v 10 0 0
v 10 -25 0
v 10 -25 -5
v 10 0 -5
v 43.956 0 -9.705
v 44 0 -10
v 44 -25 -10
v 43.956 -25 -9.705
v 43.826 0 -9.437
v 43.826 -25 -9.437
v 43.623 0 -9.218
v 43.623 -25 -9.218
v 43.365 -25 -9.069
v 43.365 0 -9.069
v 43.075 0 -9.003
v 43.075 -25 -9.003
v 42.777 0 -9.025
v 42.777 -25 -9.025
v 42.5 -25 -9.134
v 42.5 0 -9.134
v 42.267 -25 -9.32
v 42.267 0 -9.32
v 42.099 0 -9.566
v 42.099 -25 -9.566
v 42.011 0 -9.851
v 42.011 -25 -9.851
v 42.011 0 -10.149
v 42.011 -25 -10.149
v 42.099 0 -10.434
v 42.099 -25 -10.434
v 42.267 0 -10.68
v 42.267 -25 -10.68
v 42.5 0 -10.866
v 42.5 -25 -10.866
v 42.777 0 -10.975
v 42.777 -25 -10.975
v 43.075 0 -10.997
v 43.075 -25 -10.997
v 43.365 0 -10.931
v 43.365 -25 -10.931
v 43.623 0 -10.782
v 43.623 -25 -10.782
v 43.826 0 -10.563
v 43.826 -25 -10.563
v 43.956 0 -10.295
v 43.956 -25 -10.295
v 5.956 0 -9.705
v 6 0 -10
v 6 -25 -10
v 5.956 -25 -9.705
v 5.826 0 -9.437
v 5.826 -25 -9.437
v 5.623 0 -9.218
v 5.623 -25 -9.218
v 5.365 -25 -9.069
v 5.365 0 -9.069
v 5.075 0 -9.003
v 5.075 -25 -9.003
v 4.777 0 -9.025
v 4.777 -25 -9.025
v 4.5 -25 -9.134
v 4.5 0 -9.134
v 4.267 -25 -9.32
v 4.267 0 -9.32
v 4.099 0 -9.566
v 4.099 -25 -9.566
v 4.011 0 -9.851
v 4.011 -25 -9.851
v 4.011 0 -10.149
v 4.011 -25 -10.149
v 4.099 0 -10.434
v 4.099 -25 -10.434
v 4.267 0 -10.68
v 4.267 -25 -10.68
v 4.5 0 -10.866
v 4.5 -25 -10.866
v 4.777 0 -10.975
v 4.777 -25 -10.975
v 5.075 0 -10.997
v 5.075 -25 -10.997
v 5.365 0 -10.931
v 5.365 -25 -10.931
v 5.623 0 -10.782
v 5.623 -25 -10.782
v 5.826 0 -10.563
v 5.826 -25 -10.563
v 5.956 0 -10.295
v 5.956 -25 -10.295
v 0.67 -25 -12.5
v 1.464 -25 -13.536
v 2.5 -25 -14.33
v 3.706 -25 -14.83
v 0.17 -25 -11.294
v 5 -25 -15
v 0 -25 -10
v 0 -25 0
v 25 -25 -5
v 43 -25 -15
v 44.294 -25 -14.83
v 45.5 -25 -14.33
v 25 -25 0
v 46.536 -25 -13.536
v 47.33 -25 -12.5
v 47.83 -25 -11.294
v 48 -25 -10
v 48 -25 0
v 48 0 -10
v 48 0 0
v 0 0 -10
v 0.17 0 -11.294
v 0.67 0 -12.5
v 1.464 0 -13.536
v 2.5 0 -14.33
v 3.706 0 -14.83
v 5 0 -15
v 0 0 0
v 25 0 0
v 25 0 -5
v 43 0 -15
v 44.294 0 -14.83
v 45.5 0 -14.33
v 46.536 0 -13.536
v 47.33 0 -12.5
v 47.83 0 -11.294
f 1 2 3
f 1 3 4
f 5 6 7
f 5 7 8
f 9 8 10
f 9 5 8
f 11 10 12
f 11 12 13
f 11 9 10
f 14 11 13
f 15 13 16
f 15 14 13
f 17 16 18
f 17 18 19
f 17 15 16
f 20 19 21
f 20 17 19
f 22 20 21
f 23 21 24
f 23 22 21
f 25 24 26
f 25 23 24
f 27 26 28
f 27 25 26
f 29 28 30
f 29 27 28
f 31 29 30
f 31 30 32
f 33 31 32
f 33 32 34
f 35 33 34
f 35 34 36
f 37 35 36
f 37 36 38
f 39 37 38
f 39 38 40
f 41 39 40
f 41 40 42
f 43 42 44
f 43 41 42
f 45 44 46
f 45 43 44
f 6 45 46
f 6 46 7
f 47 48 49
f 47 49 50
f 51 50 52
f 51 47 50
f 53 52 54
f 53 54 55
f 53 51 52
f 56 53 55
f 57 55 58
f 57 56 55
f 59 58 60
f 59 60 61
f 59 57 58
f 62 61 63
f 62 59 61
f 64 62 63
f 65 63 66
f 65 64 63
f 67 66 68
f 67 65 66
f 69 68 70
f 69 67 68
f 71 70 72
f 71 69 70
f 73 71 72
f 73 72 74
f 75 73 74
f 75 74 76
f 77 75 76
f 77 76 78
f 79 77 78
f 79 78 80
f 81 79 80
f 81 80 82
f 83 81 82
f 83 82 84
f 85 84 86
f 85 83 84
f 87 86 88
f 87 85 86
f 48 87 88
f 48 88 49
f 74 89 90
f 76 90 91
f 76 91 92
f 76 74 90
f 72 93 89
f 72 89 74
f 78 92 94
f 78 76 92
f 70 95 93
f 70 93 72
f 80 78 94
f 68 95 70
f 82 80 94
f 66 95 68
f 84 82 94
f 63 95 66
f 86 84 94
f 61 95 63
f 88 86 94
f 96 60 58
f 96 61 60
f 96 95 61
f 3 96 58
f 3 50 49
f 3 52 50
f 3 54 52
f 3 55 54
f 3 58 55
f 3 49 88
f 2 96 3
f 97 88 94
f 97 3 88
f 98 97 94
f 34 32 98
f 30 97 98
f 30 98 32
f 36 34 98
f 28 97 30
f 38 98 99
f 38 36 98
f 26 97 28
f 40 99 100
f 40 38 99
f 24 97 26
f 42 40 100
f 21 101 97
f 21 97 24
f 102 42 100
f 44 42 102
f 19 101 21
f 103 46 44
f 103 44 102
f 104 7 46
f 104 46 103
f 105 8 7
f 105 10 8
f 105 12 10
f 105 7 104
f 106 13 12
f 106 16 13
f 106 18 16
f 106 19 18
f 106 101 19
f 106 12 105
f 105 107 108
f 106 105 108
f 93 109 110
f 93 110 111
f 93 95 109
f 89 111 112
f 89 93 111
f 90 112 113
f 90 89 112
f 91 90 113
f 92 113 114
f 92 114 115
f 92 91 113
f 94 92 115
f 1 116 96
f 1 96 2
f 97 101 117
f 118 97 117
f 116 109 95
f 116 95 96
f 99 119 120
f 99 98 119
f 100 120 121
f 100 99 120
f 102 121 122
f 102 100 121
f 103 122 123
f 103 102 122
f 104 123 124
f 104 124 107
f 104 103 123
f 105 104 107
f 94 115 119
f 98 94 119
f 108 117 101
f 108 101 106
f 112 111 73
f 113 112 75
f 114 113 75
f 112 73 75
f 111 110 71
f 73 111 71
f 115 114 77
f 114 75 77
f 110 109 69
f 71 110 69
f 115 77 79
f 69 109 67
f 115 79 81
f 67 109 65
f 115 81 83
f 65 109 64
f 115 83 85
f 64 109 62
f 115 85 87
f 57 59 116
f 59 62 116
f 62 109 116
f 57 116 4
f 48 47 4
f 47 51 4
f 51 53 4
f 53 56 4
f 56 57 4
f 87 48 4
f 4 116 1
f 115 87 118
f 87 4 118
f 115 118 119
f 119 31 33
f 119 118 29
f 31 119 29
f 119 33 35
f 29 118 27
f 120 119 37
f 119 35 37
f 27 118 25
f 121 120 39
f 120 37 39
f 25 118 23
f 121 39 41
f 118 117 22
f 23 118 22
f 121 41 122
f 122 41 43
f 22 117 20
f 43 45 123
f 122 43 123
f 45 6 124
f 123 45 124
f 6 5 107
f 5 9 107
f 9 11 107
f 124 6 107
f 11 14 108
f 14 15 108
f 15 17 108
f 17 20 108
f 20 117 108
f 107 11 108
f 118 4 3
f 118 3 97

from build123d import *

# Parameters (mm, degrees)
F0_W     = 48
F0_H     = 15
F0_R     = 1
F1_DEPTH = 25
F2_R     = 5
F3_W     = 15
F3_H     = 25
F4_DEPTH = 5


with BuildPart() as f1:
    # F0 (on Front) → F1 (new body)
    with BuildSketch(Plane.XZ):
        with Locations((24, -7.5)):
            Rectangle(F0_W, F0_H)
        with Locations((5, -10)):
            Circle(F0_R, mode=Mode.SUBTRACT)
        with Locations((43, -10)):
            Circle(F0_R, mode=Mode.SUBTRACT)
    extrude(amount=F1_DEPTH)

    # F2
    f2_edges = [f1.edges().sort_by_distance(p)[0] for p in [
        (0, -12.5, -15),
        (48, -12.5, -15),
    ]]
    fillet(f2_edges, radius=F2_R)

    # F3 (on face) → F4 (cut)
    with BuildSketch(Plane.XY):
        with Locations((17.5, -12.5)):
            Rectangle(F3_W, F3_H)
    extrude(amount=-F4_DEPTH, mode=Mode.SUBTRACT)


solid = f1.part
